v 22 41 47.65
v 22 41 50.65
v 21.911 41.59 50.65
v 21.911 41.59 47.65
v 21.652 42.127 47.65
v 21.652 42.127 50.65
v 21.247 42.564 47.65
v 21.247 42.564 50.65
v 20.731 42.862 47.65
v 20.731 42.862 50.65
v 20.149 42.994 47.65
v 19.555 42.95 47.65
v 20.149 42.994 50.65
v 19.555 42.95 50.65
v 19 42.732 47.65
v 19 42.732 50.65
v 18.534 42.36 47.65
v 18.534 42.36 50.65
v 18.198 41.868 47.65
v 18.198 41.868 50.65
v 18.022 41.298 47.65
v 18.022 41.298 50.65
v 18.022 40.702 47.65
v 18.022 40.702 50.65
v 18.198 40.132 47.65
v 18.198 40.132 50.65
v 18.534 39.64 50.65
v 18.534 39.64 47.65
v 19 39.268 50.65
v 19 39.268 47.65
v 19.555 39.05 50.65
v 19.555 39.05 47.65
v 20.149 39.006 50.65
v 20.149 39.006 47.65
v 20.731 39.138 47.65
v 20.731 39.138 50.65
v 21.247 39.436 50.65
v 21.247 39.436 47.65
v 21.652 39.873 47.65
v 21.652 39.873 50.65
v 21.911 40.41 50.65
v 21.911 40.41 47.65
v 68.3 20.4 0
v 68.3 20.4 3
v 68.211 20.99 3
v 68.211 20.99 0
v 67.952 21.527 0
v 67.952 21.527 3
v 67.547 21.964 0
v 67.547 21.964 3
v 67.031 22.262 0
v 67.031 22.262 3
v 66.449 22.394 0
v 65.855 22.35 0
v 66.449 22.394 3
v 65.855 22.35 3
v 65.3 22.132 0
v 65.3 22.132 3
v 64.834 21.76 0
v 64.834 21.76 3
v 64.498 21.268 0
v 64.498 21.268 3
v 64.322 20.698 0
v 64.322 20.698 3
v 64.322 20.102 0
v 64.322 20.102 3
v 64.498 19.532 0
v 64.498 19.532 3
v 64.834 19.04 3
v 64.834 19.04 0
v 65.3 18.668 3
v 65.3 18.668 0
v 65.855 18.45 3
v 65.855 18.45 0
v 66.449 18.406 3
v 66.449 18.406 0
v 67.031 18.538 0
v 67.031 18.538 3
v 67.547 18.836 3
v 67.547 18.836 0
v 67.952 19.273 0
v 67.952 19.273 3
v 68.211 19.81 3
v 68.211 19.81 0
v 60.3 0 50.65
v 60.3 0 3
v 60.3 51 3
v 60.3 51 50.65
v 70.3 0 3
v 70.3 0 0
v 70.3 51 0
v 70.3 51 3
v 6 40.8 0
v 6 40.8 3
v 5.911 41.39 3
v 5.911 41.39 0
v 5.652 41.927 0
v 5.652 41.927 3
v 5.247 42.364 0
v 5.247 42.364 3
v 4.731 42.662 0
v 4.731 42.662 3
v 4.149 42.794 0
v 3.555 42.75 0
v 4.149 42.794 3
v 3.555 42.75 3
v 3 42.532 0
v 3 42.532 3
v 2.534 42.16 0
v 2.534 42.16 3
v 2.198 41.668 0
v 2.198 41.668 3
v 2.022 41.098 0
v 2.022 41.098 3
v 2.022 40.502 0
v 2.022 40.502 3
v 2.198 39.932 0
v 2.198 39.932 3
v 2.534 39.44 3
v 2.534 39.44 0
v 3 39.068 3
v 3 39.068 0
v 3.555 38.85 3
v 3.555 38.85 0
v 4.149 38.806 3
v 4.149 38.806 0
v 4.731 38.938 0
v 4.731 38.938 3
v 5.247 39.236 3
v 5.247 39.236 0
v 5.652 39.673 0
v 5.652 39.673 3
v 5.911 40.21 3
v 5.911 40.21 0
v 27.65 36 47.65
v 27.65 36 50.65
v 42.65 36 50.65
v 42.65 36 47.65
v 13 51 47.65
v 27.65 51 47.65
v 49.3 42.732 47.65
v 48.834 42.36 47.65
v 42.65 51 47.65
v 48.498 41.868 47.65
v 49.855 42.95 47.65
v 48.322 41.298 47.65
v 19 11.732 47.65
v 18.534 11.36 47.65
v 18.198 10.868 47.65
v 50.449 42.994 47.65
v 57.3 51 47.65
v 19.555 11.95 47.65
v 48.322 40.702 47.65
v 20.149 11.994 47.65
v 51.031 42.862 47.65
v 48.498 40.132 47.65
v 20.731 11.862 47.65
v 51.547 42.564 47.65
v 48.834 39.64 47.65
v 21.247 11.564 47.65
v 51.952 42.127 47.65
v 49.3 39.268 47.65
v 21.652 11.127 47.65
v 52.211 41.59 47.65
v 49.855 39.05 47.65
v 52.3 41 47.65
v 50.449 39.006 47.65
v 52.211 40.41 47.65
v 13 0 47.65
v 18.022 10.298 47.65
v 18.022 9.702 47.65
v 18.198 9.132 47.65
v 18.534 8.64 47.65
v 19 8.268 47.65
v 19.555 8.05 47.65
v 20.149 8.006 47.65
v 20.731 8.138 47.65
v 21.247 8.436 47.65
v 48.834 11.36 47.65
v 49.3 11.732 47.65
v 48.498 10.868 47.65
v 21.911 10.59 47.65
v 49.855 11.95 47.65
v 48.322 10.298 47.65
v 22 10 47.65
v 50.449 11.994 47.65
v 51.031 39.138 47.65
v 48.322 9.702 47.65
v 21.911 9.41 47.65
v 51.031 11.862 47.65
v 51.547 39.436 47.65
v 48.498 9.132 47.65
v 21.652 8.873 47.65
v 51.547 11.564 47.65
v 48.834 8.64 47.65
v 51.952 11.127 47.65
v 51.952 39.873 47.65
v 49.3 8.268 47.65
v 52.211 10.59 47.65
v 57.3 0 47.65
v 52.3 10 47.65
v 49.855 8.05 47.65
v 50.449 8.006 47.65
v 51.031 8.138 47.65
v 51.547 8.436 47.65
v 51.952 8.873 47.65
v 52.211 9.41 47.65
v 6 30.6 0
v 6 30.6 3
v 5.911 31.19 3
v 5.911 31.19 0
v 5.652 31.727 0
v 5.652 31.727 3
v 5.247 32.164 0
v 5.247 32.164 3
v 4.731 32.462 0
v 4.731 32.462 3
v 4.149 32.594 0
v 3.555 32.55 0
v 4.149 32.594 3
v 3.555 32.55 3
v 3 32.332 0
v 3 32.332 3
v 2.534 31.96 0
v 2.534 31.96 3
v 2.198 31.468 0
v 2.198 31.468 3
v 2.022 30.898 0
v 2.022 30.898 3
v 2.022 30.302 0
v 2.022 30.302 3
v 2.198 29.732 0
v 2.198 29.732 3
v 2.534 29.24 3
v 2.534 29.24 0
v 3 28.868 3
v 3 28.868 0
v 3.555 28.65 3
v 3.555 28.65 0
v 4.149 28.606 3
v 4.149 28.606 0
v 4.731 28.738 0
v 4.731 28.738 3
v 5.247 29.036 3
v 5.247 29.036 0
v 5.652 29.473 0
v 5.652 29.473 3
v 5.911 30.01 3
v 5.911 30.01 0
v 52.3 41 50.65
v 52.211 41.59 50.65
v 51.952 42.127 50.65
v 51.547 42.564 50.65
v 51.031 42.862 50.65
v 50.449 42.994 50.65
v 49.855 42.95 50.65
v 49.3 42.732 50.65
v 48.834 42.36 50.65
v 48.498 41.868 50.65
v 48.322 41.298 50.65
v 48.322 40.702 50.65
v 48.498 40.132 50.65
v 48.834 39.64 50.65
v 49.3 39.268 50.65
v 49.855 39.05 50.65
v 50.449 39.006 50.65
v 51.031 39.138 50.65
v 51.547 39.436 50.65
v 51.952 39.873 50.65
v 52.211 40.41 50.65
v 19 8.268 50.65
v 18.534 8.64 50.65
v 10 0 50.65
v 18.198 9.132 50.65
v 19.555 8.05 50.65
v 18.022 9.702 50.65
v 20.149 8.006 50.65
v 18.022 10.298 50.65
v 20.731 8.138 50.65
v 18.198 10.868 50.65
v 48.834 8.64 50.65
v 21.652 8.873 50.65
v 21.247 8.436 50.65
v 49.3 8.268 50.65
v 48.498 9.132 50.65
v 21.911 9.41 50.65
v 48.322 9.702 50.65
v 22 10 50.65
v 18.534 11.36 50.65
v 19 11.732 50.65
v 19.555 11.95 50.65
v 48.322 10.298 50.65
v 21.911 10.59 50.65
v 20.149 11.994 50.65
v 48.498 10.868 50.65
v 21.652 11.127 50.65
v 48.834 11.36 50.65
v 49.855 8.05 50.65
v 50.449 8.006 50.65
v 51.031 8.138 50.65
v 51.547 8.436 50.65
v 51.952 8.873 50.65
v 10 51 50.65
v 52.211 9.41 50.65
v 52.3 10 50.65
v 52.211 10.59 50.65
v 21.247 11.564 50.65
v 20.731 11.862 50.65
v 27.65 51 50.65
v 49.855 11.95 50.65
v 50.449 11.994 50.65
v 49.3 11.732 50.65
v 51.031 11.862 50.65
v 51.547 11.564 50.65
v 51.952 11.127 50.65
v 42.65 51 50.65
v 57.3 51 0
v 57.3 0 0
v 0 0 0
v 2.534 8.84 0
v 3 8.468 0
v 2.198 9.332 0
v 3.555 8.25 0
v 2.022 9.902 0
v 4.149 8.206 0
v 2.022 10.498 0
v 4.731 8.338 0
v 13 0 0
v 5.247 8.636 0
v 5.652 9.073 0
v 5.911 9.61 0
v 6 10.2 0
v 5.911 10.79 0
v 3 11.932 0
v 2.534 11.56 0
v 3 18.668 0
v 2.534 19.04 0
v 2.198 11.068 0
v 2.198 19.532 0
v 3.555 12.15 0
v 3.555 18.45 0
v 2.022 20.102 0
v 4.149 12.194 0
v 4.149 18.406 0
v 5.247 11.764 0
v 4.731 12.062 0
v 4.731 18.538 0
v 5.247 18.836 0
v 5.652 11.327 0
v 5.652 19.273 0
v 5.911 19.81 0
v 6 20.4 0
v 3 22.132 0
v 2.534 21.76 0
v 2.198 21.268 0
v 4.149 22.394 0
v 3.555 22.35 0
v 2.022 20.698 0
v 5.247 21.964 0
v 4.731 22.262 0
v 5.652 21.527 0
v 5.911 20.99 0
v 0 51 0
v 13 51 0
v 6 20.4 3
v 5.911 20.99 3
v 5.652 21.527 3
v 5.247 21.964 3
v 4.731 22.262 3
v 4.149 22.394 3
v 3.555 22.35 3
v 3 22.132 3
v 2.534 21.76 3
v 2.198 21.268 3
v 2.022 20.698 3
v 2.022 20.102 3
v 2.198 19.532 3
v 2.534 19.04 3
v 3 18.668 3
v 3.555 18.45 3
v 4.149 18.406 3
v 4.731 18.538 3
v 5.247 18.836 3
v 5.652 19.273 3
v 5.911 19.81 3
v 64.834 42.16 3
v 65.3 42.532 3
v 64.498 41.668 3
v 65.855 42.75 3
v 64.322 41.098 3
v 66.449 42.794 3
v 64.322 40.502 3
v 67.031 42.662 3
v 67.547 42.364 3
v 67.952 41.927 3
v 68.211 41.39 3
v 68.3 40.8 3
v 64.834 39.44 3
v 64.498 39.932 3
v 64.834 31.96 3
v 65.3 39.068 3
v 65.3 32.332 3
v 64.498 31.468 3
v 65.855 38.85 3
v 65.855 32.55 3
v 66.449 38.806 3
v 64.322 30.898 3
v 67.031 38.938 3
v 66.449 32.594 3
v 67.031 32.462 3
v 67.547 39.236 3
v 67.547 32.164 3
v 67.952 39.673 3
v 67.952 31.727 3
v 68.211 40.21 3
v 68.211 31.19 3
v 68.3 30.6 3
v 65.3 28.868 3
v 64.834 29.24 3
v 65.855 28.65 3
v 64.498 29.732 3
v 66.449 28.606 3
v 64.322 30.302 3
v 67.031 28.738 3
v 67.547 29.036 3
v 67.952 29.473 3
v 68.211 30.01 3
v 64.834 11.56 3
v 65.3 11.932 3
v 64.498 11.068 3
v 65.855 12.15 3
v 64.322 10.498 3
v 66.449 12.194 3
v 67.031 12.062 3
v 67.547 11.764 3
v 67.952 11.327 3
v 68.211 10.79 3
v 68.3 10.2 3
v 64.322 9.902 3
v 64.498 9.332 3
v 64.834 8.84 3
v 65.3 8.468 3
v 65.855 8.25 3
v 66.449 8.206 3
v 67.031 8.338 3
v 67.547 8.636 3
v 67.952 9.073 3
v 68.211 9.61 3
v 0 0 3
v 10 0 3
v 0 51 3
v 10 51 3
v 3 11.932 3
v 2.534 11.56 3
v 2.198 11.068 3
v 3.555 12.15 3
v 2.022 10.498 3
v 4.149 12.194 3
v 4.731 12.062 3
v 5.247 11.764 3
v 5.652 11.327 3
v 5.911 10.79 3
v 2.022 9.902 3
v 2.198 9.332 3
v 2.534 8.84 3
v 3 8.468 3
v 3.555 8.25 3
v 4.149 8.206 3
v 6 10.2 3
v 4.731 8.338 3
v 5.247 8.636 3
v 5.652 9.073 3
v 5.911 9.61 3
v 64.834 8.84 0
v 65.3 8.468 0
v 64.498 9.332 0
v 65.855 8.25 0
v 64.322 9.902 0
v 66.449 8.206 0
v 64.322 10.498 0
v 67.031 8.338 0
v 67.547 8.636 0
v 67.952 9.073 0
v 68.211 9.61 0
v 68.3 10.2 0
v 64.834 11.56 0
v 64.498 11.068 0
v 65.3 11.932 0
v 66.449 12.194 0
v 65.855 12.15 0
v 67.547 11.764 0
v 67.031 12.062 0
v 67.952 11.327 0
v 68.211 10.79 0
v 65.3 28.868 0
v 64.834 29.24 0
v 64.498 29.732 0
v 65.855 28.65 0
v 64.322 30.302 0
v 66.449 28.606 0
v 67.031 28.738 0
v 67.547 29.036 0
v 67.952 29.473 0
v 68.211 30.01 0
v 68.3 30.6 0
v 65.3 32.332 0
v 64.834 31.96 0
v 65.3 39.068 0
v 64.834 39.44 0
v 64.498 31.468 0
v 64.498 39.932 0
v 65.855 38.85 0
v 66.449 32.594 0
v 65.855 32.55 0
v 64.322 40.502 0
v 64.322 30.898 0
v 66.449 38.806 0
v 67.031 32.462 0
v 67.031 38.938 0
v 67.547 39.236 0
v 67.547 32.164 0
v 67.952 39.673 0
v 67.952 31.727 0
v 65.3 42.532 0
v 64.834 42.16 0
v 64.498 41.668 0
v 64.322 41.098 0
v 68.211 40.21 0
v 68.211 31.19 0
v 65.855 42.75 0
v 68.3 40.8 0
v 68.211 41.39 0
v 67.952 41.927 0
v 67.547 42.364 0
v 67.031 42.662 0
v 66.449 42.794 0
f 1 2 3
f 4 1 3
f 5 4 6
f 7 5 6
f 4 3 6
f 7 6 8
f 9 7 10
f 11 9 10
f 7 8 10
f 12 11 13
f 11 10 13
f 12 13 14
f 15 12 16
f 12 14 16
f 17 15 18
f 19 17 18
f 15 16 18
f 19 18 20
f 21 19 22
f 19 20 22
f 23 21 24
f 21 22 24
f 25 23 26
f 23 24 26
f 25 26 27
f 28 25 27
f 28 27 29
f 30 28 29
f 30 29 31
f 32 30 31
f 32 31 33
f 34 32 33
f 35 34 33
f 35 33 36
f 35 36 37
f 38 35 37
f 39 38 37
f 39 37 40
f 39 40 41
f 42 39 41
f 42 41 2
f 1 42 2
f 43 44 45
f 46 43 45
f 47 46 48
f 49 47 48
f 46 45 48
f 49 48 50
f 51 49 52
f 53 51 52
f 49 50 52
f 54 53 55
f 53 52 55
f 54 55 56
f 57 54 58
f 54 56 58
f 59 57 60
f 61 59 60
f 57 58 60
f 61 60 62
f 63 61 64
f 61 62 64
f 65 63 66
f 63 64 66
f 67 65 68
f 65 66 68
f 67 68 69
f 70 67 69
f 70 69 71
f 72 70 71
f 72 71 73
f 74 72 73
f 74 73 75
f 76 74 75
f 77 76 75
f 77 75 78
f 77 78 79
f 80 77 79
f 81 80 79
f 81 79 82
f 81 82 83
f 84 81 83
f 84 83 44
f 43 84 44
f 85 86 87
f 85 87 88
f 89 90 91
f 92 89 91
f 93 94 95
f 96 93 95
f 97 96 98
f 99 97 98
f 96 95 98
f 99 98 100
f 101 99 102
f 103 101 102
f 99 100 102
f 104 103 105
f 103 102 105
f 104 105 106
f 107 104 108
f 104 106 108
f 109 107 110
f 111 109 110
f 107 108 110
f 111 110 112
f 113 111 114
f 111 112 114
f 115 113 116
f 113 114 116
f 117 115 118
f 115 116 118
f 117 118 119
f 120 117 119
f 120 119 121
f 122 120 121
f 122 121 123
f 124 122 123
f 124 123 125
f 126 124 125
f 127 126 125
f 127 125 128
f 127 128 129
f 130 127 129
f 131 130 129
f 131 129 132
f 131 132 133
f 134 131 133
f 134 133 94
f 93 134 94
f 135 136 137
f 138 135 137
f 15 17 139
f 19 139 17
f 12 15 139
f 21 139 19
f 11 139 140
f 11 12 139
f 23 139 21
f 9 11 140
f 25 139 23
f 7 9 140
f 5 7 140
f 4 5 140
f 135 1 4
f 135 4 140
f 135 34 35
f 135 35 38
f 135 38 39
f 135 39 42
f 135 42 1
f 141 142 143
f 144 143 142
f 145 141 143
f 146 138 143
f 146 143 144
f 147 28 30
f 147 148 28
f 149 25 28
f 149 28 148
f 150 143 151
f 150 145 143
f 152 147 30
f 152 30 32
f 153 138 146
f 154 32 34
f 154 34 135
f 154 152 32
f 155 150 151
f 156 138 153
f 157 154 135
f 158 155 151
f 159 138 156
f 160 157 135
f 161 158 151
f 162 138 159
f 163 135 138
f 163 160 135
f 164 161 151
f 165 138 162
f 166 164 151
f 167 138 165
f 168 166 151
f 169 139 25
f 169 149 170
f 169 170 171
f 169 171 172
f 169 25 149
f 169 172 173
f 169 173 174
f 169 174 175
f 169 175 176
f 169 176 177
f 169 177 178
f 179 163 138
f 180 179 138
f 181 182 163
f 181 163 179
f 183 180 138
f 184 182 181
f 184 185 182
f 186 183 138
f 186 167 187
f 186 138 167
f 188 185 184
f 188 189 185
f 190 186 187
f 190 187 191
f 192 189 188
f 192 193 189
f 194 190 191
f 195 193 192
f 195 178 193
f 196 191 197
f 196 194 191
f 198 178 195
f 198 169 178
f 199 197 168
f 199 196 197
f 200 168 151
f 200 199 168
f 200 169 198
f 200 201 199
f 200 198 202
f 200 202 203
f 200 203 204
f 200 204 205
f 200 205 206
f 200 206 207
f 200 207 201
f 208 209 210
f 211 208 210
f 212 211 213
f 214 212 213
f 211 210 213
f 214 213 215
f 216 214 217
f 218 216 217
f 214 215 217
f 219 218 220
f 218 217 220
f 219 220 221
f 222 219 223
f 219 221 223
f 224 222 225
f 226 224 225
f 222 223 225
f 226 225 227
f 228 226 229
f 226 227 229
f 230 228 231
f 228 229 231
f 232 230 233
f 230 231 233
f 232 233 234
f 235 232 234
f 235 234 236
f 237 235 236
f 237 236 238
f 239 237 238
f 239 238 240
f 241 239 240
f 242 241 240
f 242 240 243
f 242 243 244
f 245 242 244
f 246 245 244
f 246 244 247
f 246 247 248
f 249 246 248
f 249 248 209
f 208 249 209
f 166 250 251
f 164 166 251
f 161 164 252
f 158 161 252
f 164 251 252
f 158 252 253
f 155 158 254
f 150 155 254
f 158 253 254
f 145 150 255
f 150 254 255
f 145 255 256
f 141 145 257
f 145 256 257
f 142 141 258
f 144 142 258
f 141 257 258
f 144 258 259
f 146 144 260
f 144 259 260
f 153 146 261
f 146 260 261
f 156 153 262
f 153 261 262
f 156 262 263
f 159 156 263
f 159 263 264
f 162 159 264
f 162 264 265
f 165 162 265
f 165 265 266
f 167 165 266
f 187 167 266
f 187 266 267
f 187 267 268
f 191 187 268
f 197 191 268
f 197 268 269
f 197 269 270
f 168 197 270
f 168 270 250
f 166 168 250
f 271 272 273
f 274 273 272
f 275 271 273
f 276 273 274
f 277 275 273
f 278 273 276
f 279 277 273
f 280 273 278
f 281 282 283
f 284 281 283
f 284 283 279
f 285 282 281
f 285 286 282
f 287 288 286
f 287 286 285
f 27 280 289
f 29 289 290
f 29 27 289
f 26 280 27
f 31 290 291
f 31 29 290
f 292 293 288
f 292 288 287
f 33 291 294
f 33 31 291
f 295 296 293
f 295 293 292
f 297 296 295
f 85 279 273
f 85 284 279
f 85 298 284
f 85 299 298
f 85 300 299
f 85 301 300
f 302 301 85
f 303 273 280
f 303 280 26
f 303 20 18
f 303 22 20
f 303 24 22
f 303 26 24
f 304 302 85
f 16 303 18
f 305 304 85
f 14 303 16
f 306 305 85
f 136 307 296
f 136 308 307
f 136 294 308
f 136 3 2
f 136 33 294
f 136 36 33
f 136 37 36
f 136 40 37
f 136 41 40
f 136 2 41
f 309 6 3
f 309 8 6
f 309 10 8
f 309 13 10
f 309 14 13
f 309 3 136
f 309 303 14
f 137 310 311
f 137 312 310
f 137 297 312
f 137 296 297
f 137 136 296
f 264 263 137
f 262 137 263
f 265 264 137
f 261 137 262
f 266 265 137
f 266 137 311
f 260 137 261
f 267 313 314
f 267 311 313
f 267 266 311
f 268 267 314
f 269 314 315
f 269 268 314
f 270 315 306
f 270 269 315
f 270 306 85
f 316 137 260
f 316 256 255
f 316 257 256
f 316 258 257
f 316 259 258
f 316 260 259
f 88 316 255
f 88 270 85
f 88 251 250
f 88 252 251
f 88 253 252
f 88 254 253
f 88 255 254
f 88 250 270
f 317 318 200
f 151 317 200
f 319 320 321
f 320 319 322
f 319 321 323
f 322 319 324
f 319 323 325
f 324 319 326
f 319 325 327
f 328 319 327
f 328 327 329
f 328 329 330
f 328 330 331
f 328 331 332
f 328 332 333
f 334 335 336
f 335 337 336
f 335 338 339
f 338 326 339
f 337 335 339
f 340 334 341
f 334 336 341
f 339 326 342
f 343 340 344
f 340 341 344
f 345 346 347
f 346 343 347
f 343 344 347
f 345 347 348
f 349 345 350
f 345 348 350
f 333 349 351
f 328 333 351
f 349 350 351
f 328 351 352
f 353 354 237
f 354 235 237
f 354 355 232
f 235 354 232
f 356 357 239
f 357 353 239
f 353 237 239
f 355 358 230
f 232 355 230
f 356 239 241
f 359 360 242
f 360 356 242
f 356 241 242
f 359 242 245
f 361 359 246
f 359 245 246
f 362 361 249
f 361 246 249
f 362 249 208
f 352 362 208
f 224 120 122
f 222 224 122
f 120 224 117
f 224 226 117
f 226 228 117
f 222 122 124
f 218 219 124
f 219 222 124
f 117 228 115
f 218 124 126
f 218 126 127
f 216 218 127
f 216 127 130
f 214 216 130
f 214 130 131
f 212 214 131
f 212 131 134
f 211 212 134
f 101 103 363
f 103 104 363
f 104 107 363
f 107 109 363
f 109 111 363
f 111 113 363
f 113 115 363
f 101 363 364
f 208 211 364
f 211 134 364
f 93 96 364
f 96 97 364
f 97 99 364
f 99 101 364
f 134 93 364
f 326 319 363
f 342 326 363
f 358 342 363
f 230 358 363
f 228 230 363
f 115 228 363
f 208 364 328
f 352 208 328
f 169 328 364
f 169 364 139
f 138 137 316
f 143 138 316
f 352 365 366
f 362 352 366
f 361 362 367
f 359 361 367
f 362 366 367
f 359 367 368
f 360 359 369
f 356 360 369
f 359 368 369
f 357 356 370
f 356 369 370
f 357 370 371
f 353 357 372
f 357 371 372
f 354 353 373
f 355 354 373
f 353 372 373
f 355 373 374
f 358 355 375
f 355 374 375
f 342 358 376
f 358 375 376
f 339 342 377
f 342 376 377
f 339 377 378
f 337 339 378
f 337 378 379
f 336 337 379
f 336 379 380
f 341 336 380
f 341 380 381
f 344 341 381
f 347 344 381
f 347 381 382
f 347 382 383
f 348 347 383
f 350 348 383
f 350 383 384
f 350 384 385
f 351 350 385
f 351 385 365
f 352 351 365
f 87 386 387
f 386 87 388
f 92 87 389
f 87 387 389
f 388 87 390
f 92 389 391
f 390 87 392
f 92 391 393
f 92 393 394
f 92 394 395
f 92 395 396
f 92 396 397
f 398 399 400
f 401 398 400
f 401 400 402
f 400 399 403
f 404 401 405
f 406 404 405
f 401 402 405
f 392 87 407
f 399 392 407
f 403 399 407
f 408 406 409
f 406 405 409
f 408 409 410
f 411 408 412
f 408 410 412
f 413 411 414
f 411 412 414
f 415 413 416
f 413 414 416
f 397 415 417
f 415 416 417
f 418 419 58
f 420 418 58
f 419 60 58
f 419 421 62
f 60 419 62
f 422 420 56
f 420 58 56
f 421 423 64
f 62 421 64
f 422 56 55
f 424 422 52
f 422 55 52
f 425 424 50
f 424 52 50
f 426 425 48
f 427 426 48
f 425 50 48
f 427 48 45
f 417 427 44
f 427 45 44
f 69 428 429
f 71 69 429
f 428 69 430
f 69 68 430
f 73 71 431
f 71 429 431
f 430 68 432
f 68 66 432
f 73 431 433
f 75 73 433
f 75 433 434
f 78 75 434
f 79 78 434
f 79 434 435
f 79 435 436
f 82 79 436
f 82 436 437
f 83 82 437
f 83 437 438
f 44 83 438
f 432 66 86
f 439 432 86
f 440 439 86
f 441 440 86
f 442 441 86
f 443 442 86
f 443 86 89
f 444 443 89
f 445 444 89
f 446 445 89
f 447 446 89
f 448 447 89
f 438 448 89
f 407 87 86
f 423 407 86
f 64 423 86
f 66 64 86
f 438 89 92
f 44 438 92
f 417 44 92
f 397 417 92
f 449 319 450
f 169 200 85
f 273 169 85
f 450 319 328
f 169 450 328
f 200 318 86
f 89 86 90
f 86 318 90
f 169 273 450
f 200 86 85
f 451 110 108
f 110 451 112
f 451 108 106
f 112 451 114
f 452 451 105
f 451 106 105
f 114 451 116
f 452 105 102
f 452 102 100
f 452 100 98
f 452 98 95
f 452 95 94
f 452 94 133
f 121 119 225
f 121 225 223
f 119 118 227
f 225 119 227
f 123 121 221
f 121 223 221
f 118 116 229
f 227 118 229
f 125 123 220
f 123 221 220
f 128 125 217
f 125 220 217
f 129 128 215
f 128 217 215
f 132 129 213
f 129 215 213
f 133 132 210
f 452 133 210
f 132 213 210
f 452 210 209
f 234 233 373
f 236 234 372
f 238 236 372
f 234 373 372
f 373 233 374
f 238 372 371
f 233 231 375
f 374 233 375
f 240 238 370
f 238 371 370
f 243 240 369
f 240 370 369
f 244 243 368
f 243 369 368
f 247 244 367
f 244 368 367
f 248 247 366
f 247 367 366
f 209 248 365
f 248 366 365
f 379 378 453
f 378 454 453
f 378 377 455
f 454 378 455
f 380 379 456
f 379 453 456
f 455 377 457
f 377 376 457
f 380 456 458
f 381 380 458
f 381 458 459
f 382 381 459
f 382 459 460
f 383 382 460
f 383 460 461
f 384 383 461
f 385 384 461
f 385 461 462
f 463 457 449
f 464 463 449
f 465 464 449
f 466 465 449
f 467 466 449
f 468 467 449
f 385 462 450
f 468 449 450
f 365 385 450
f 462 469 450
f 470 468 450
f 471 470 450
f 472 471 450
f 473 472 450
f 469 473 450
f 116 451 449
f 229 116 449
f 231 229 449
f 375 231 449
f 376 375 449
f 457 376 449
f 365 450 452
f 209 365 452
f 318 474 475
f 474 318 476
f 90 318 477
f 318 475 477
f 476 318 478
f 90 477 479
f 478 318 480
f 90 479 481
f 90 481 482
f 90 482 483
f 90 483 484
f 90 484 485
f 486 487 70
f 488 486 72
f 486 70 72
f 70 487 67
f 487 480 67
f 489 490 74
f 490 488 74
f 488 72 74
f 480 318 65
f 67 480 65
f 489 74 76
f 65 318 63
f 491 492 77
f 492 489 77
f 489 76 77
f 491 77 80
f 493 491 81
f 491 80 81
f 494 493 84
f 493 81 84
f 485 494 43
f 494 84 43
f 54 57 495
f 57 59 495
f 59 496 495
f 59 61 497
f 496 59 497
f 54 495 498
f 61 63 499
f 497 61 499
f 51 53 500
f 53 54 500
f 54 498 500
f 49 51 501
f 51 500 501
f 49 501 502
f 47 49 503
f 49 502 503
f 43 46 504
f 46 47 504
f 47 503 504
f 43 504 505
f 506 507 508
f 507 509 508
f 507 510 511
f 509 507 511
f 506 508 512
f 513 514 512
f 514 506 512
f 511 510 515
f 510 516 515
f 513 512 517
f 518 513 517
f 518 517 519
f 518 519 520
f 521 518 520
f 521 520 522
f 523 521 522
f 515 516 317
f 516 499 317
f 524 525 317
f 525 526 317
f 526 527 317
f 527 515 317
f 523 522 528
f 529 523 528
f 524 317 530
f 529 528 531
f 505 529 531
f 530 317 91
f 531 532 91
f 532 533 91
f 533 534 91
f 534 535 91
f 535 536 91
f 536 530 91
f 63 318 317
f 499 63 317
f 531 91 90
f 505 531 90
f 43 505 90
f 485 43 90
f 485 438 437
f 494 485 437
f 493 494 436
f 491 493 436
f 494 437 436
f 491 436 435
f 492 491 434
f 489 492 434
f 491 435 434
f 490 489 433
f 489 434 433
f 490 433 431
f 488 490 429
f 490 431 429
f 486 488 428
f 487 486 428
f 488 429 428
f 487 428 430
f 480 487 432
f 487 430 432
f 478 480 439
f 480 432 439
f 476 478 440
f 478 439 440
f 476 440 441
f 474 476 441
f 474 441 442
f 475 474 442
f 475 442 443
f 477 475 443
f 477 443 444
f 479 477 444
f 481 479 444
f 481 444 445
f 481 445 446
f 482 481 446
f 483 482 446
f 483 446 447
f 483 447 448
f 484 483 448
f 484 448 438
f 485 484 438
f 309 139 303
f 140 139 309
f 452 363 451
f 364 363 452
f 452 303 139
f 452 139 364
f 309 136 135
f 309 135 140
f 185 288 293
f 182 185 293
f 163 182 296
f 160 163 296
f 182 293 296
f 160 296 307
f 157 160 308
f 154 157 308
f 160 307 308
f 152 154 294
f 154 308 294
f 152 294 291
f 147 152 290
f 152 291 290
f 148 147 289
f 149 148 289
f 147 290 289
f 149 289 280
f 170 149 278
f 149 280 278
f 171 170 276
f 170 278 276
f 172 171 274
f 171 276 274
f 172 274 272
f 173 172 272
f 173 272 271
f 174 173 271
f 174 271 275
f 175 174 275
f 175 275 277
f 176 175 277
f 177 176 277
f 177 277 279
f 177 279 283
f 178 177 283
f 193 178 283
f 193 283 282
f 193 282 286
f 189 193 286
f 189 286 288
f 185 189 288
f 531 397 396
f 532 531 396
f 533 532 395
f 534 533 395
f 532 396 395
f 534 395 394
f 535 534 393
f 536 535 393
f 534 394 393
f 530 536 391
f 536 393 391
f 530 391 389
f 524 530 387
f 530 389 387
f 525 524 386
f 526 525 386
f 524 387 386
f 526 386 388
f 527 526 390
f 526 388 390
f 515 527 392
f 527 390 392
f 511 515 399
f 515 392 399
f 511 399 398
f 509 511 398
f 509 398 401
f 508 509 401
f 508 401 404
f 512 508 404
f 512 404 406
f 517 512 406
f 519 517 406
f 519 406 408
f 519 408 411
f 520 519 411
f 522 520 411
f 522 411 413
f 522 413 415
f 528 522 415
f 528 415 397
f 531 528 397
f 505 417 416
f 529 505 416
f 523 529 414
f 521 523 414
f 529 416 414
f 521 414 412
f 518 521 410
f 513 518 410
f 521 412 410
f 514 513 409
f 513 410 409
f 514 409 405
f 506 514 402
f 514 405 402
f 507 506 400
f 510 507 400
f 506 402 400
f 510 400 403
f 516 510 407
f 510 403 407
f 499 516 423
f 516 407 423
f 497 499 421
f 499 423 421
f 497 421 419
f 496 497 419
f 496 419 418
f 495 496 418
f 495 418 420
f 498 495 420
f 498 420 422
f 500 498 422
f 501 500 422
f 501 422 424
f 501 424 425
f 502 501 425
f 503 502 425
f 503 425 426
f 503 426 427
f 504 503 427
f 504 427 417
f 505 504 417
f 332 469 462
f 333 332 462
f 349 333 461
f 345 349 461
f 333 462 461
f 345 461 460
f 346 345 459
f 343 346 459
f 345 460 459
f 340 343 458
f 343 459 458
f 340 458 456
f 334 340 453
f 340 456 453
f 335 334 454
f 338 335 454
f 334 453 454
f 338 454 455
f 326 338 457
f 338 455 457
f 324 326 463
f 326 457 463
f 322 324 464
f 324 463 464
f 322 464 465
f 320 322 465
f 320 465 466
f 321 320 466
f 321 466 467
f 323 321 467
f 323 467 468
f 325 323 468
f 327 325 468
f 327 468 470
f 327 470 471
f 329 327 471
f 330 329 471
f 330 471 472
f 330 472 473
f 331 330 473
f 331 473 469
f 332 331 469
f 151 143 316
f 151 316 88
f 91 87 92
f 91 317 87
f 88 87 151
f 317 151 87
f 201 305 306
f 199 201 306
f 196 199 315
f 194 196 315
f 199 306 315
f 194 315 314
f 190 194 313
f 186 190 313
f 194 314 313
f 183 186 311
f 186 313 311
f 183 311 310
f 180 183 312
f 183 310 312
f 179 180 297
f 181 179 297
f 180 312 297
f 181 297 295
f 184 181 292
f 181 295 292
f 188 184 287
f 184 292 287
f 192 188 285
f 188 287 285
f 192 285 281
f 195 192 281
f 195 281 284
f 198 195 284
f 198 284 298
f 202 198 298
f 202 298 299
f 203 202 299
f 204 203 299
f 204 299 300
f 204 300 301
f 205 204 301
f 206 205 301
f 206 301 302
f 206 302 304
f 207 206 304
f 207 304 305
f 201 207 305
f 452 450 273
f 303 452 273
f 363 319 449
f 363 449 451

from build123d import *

# Parameters (mm, degrees)
SKETCH_W        = 70.3
SKETCH_H        = 51
PAD_DEPTH       = 50.65
SKETCH001_W     = 44.3
SKETCH001_H     = 47.65
SKETCH001_W_2   = 10
POCKET_DEPTH    = 51.001
SKETCH002_R     = 2
SKETCH002_W     = 15
SKETCH002_H     = 15
POCKET001_DEPTH = 50.651


with BuildPart() as part:
    # Sketch → Pad (new body)
    with BuildSketch(Plane.XY):
        with Locations((35.15, 25.5)):
            Rectangle(SKETCH_W, SKETCH_H)
    extrude(amount=PAD_DEPTH)

    # Sketch001 → Pocket (cut, through all)
    with BuildSketch(Plane.XZ):
        with Locations((35.15, 23.825)):
            Rectangle(SKETCH001_W, SKETCH001_H)
        with Locations((5, 26.825)):
            Rectangle(SKETCH001_W_2, SKETCH001_H)
        with Locations((65.3, 26.825)):
            Rectangle(SKETCH001_W_2, SKETCH001_H)
    extrude(amount=-POCKET_DEPTH, mode=Mode.SUBTRACT)

    # Sketch002 → Pocket001 (cut, through all)
    with BuildSketch(Plane.XY.offset(50.65)):
        with Locations((20, 41)):
            Circle(SKETCH002_R)
        with Locations((50.3, 41)):
            Circle(SKETCH002_R)
        with Locations((20, 10)):
            Circle(SKETCH002_R)
        with Locations((50.3, 10)):
            Circle(SKETCH002_R)
        with Locations((4, 40.8)):
            Circle(SKETCH002_R)
        with Locations((4, 30.6)):
            Circle(SKETCH002_R)
        with Locations((4, 20.4)):
            Circle(SKETCH002_R)
        with Locations((4, 10.2)):
            Circle(SKETCH002_R)
        with Locations((66.3, 40.8)):
            Circle(SKETCH002_R)
        with Locations((66.3, 30.6)):
            Circle(SKETCH002_R)
        with Locations((66.3, 20.4)):
            Circle(SKETCH002_R)
        with Locations((66.3, 10.2)):
            Circle(SKETCH002_R)
        with Locations((35.15, 43.5)):
            Rectangle(SKETCH002_W, SKETCH002_H)
    extrude(amount=-POCKET001_DEPTH, mode=Mode.SUBTRACT)


solid = part.part
